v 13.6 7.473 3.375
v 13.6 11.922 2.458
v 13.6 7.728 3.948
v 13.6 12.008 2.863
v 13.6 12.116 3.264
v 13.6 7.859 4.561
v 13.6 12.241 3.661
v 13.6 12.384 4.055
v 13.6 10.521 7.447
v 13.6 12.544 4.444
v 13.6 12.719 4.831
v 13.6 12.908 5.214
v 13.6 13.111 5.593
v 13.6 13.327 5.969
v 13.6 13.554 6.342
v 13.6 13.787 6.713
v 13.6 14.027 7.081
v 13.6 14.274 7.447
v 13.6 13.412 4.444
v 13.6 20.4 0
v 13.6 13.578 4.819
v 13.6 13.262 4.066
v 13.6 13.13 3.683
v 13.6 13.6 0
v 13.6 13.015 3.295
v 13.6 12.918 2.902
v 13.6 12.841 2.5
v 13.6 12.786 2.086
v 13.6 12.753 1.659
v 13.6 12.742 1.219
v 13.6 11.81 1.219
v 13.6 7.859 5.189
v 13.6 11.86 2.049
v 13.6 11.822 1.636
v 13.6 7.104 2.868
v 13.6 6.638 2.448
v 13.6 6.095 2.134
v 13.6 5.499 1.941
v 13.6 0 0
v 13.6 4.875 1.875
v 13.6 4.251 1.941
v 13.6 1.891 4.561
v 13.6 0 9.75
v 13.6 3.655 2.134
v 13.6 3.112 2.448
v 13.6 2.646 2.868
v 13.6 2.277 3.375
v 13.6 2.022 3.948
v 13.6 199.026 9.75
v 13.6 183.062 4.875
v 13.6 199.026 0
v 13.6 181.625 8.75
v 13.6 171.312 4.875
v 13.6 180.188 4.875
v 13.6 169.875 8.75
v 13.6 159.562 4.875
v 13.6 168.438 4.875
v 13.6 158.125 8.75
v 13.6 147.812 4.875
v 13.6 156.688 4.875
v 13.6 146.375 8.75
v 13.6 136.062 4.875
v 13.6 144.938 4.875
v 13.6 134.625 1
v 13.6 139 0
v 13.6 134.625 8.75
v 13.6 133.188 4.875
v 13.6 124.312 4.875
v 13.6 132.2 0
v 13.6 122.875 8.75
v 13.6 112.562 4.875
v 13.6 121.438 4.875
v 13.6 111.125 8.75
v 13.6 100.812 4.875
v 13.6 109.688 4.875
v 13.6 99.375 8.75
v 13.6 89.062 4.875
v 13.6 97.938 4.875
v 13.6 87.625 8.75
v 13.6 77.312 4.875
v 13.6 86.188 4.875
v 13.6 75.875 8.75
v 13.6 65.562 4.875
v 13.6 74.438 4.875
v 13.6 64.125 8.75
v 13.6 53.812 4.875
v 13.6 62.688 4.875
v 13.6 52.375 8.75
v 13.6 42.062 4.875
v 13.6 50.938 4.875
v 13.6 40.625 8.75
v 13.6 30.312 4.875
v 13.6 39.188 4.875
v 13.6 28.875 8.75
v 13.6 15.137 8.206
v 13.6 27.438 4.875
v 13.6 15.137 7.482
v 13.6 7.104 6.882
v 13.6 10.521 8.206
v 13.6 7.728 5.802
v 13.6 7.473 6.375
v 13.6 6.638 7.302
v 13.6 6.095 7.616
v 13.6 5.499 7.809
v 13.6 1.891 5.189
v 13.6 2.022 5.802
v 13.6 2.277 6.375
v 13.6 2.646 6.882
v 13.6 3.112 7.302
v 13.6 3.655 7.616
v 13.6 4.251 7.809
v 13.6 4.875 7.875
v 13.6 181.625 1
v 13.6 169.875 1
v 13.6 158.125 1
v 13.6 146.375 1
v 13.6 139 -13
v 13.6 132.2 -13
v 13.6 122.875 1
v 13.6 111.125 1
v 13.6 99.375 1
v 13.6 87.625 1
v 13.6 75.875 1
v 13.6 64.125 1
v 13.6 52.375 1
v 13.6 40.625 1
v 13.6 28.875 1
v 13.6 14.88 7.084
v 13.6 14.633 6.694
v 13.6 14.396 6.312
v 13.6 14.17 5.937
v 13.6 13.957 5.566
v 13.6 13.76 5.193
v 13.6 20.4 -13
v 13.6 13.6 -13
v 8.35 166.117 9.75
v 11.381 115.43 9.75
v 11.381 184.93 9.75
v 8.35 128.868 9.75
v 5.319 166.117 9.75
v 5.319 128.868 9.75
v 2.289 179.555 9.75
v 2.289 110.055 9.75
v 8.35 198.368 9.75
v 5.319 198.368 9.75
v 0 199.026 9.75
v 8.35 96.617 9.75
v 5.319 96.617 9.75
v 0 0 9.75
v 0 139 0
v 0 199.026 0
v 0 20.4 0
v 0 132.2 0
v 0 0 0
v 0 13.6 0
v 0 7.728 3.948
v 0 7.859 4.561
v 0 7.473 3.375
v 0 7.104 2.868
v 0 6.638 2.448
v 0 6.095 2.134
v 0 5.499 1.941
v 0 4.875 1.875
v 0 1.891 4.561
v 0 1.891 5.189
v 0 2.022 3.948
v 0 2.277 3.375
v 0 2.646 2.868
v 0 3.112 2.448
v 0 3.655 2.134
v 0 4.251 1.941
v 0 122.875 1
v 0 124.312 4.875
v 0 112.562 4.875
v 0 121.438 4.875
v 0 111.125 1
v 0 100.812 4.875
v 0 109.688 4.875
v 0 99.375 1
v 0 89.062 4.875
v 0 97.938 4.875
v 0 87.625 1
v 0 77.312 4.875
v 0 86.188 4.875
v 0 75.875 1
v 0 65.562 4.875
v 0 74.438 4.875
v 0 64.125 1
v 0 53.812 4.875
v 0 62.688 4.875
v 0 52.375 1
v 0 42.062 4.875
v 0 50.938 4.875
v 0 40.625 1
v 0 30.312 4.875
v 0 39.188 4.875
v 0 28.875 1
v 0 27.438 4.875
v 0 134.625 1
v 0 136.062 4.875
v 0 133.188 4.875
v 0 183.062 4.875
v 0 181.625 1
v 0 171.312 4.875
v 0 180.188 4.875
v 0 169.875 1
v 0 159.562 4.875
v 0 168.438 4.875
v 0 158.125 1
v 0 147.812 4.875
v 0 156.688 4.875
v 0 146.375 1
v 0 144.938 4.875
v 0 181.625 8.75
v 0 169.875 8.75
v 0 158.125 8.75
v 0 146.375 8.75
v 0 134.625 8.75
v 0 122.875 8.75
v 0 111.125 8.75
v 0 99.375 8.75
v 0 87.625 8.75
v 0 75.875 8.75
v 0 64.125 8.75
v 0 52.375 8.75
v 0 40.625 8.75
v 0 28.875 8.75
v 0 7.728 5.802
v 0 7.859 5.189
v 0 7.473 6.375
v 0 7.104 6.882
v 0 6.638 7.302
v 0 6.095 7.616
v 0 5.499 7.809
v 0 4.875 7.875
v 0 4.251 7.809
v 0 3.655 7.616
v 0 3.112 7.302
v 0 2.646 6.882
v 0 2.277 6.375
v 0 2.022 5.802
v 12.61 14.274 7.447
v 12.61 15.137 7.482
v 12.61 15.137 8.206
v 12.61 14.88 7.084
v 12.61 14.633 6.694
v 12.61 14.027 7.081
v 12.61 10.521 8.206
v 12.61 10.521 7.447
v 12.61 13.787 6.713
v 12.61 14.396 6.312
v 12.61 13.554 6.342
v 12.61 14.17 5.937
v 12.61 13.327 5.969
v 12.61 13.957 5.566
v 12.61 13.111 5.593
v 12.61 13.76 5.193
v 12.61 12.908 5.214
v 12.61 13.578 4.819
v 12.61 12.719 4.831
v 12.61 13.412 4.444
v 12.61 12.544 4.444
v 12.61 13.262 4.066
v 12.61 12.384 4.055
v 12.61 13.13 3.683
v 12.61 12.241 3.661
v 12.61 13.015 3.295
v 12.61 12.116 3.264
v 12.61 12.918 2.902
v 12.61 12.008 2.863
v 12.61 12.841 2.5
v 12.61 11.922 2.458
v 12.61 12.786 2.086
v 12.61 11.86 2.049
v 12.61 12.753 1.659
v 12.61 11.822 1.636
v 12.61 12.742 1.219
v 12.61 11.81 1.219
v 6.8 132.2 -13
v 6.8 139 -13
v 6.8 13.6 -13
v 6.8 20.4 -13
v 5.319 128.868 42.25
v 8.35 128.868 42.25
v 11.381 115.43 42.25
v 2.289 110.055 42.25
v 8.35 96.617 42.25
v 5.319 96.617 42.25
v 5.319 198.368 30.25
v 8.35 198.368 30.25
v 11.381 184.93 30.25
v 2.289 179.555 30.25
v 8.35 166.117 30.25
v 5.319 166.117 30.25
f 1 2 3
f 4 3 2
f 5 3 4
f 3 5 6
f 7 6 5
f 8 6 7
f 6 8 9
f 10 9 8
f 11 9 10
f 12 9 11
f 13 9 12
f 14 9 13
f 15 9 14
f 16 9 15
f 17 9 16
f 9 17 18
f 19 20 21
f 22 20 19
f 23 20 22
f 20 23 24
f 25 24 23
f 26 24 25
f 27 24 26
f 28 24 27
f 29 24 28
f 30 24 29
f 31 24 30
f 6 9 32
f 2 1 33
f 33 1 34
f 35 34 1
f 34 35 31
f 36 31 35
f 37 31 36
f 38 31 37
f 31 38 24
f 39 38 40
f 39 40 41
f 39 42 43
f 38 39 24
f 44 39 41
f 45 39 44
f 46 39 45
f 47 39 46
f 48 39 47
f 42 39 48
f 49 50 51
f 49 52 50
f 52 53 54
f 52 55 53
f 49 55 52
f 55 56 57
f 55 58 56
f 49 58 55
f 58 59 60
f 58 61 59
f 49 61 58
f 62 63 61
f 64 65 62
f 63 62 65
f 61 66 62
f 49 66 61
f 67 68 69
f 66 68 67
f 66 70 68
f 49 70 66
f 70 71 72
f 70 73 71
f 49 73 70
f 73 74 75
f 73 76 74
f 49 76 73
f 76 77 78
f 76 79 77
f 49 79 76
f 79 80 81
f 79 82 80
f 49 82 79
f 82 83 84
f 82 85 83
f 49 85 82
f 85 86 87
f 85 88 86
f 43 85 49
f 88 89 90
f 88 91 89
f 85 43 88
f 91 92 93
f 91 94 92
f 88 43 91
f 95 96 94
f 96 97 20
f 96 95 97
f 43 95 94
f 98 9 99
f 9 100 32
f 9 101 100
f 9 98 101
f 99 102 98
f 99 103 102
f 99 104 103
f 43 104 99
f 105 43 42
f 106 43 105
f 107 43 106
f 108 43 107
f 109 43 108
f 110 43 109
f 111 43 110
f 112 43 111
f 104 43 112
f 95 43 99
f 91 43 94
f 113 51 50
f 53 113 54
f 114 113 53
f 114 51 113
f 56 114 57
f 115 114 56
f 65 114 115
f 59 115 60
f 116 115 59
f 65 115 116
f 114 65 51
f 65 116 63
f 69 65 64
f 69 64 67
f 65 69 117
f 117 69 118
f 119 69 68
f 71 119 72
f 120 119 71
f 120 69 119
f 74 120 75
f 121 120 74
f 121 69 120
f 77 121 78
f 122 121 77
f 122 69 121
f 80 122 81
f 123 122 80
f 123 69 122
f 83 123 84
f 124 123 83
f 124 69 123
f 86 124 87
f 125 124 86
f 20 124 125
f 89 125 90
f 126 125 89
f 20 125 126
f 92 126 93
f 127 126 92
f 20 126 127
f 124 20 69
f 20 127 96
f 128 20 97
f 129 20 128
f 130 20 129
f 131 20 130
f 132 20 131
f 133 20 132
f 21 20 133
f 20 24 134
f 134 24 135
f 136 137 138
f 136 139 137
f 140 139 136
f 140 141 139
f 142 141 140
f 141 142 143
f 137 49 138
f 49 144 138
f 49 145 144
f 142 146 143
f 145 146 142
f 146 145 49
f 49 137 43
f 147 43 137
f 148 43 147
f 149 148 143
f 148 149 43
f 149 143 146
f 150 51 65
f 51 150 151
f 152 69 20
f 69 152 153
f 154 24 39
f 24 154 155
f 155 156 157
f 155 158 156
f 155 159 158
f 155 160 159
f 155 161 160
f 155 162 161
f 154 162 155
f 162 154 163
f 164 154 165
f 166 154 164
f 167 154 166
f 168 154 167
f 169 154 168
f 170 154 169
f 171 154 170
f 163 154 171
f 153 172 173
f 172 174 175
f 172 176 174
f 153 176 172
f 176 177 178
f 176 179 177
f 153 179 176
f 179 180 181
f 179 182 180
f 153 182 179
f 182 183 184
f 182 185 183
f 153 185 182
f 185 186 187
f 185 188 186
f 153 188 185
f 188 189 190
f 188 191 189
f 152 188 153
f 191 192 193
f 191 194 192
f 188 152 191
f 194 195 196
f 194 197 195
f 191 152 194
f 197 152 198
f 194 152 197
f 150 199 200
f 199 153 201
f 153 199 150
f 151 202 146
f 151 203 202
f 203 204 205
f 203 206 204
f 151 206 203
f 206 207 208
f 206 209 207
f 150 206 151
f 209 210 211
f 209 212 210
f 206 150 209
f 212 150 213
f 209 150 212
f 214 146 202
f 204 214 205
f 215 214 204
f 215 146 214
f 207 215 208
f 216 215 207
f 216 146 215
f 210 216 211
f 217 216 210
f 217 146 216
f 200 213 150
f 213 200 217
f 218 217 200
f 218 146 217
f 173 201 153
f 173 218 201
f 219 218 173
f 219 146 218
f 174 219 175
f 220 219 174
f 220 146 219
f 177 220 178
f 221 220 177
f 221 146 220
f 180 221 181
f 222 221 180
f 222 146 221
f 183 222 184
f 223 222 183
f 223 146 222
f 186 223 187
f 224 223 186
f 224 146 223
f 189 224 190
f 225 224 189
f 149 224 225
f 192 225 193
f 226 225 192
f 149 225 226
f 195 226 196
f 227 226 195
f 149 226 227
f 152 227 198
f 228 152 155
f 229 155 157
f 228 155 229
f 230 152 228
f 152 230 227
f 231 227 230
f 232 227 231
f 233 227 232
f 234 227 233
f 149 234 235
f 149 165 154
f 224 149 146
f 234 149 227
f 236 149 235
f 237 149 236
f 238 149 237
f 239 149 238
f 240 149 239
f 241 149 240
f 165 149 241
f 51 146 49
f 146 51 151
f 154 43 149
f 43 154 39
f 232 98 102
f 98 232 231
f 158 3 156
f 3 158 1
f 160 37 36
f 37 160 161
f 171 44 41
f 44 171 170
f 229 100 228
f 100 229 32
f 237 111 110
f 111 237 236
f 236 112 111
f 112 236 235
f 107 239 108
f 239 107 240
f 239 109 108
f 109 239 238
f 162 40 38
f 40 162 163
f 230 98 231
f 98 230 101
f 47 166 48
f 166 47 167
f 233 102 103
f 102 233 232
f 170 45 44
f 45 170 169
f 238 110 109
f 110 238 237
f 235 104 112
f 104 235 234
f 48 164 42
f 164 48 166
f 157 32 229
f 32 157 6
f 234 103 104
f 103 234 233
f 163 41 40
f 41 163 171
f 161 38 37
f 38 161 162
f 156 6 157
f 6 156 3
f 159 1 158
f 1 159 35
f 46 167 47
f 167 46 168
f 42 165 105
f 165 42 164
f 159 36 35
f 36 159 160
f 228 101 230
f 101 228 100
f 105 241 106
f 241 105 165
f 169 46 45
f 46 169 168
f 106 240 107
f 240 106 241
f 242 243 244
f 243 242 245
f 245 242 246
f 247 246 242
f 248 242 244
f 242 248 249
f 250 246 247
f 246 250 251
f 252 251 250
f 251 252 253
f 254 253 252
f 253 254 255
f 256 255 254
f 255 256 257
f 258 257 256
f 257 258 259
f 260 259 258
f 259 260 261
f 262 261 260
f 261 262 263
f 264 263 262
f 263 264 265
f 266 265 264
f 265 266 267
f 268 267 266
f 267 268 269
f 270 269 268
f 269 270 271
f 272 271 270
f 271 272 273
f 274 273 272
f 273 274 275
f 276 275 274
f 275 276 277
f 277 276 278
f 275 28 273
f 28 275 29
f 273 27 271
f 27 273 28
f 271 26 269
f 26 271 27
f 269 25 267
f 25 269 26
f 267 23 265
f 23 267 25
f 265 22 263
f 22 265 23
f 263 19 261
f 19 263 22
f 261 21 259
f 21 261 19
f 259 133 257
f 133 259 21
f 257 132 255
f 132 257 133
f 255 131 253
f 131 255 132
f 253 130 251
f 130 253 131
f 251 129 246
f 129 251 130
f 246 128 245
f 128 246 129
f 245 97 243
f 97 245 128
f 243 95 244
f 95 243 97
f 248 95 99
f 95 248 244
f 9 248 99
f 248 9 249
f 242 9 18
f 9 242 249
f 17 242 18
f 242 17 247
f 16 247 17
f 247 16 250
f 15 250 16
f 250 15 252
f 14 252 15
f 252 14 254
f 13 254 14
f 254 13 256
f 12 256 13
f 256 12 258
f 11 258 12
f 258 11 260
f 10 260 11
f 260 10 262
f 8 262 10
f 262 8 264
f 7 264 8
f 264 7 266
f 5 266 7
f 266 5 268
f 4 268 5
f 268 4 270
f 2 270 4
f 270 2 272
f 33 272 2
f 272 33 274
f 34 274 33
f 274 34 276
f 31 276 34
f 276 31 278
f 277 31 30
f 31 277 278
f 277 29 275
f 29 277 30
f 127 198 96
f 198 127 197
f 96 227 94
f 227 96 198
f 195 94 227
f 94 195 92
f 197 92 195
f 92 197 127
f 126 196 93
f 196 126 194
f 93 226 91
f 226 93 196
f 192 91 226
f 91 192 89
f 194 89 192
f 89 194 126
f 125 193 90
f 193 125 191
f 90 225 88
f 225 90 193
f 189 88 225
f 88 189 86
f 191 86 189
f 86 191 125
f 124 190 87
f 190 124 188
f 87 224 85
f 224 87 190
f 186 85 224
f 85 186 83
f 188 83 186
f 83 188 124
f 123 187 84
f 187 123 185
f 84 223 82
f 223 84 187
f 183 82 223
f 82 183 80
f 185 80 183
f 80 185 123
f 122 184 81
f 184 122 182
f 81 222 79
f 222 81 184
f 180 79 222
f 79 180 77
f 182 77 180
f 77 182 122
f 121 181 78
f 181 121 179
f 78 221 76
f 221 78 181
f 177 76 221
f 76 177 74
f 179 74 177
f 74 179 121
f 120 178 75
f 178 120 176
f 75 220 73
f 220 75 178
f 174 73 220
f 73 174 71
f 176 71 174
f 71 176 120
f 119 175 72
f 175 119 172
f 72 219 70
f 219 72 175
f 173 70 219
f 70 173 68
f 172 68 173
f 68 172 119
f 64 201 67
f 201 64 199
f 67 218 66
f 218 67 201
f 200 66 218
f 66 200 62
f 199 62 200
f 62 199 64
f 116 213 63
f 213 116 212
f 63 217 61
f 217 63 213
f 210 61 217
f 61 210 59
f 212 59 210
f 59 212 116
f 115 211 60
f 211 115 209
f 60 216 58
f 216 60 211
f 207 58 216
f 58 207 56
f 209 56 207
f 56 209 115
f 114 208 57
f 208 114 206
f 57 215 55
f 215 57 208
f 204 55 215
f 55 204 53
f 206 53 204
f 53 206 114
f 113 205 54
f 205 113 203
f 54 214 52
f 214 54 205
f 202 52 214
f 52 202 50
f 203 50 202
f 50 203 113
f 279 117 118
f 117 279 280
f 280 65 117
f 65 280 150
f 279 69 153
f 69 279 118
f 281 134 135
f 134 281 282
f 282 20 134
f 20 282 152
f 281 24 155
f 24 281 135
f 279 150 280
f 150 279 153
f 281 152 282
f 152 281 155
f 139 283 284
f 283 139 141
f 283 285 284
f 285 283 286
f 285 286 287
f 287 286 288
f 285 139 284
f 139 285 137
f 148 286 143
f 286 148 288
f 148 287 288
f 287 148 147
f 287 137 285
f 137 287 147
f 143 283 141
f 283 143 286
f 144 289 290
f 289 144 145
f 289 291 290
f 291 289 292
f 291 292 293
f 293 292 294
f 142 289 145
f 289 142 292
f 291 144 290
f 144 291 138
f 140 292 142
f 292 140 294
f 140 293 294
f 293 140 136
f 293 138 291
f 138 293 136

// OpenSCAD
// file: values.scad
$fs=0.1;
//Constants:
edgeRadius=1.5;
underKeyWidth=13.6;
baseHeight=9.75;
genh=5.791666666666667;
a=27.423996629776394;
b=12.370392724366756;
c=12.370392724366756;
d=38.393595281686956;
overhead=65.81759191146335;
keyTravelDistance=13.0;
desiredGamut=24;
shift=3.092598181091689;
holeScale=0.5;
stalkScale=0.48;

Points = [
[shift,a,0],//0
[(b-shift),0,0],//1
[(b+shift),0,0],//2
[(b+c-shift),d,0],//3
[(c+shift),(a+d),0],//4
[(c-shift),(a+d),0],//5
[shift,a,keyTravelDistance],//6
[(b-shift),0,keyTravelDistance],//7
[(b+shift),0,keyTravelDistance],//8
[(b+c-shift),d,keyTravelDistance],//9
[(c+shift),(a+d),keyTravelDistance],//10
[(c-shift),(a+d),keyTravelDistance],//11
];
Faces = [
[0,1,2,3,4,5],
[1,0,6,7],
[2,1,7,8],
[3,2,8,9],
[4,3,9,10],
[5,4,10,11],
[0,5,11,6],
[11,10,9,8,7,6] 
];
// file: keytop.scad
include<values.scad>;
keytop();

module keytopShape(){
polyhedron(Points,Faces);
}
module keytop(){
difference(){
keytopShape();
translate([(b+c)/4,(d+a)/4,-0.1])
scale(holeScale,holeScale,holeScale)
keytopShape();
edge(6,11,1,-1);
edge(6,7,1,1);
edge(7,8,1,1);
edge(8,9,1,1);
edge(9,10,1,-1,-1);
edge(10,11,1,-1);
}
module edge (point1,point2,d1,d2,d3=1){
difference(){
translate([Points[point1][0],Points[point1][1],Points[point1][2]])
rotate([0,90,atan((Points[point2][1]-Points[point1][1])/(Points[point2][0]-Points[point1][0]))])
translate([0,0,d3*30])
rotate(45,0,0)
cube([pow(2*(edgeRadius*edgeRadius),1/2),pow(2*(edgeRadius*edgeRadius),1/2),90],true);
translate([Points[point1][0],Points[point1][1],Points[point1][2]])
rotate([0,90,atan((Points[point2][1]-Points[point1][1])/(Points[point2][0]-Points[point1][0]))])
translate([d1*edgeRadius,d2*edgeRadius,d3*30])
cylinder(90,edgeRadius,edgeRadius, true);
}
}

}
// main file
use<keytop.scad>
include<values.scad>
rotate([0,90,0])7_11();
module 7_11(keytops=false){
length=199.0259252447967;
rotate([0,-90,0]){
//Main Base:
difference(){
cube([underKeyWidth,length,baseHeight],false);
translate([-.1,0.5*baseHeight,0.5*baseHeight])rotate([0,90,0])
cylinder((underKeyWidth+.2),r=3, false);
translate([underKeyWidth-.99,10,0.125*baseHeight])
rotate([90,0,90])
linear_extrude(height=1){
text("7",size=baseHeight*0.75);
}

//Warp Cuts:
translate([-1,0.0+25+0.25*baseHeight,baseHeight-1])
rotate([0,90,0])
linear_extrude(height=underKeyWidth+2)
polygon(points=[[0.5*baseHeight-1,0],[baseHeight-2,0.25*baseHeight-1],[0.5*baseHeight-1,0.5*baseHeight-2],[0,0.25*baseHeight-1]]);
translate([-1,11.75+25+0.25*baseHeight,baseHeight-1])
rotate([0,90,0])
linear_extrude(height=underKeyWidth+2)
polygon(points=[[0.5*baseHeight-1,0],[baseHeight-2,0.25*baseHeight-1],[0.5*baseHeight-1,0.5*baseHeight-2],[0,0.25*baseHeight-1]]);
translate([-1,23.5+25+0.25*baseHeight,baseHeight-1])
rotate([0,90,0])
linear_extrude(height=underKeyWidth+2)
polygon(points=[[0.5*baseHeight-1,0],[baseHeight-2,0.25*baseHeight-1],[0.5*baseHeight-1,0.5*baseHeight-2],[0,0.25*baseHeight-1]]);
translate([-1,35.25+25+0.25*baseHeight,baseHeight-1])
rotate([0,90,0])
linear_extrude(height=underKeyWidth+2)
polygon(points=[[0.5*baseHeight-1,0],[baseHeight-2,0.25*baseHeight-1],[0.5*baseHeight-1,0.5*baseHeight-2],[0,0.25*baseHeight-1]]);
translate([-1,47.0+25+0.25*baseHeight,baseHeight-1])
rotate([0,90,0])
linear_extrude(height=underKeyWidth+2)
polygon(points=[[0.5*baseHeight-1,0],[baseHeight-2,0.25*baseHeight-1],[0.5*baseHeight-1,0.5*baseHeight-2],[0,0.25*baseHeight-1]]);
translate([-1,58.75+25+0.25*baseHeight,baseHeight-1])
rotate([0,90,0])
linear_extrude(height=underKeyWidth+2)
polygon(points=[[0.5*baseHeight-1,0],[baseHeight-2,0.25*baseHeight-1],[0.5*baseHeight-1,0.5*baseHeight-2],[0,0.25*baseHeight-1]]);
translate([-1,70.5+25+0.25*baseHeight,baseHeight-1])
rotate([0,90,0])
linear_extrude(height=underKeyWidth+2)
polygon(points=[[0.5*baseHeight-1,0],[baseHeight-2,0.25*baseHeight-1],[0.5*baseHeight-1,0.5*baseHeight-2],[0,0.25*baseHeight-1]]);
translate([-1,82.25+25+0.25*baseHeight,baseHeight-1])
rotate([0,90,0])
linear_extrude(height=underKeyWidth+2)
polygon(points=[[0.5*baseHeight-1,0],[baseHeight-2,0.25*baseHeight-1],[0.5*baseHeight-1,0.5*baseHeight-2],[0,0.25*baseHeight-1]]);
translate([-1,94.0+25+0.25*baseHeight,baseHeight-1])
rotate([0,90,0])
linear_extrude(height=underKeyWidth+2)
polygon(points=[[0.5*baseHeight-1,0],[baseHeight-2,0.25*baseHeight-1],[0.5*baseHeight-1,0.5*baseHeight-2],[0,0.25*baseHeight-1]]);
translate([-1,105.75+25+0.25*baseHeight,baseHeight-1])
rotate([0,90,0])
linear_extrude(height=underKeyWidth+2)
polygon(points=[[0.5*baseHeight-1,0],[baseHeight-2,0.25*baseHeight-1],[0.5*baseHeight-1,0.5*baseHeight-2],[0,0.25*baseHeight-1]]);
translate([-1,117.5+25+0.25*baseHeight,baseHeight-1])
rotate([0,90,0])
linear_extrude(height=underKeyWidth+2)
polygon(points=[[0.5*baseHeight-1,0],[baseHeight-2,0.25*baseHeight-1],[0.5*baseHeight-1,0.5*baseHeight-2],[0,0.25*baseHeight-1]]);
translate([-1,129.25+25+0.25*baseHeight,baseHeight-1])
rotate([0,90,0])
linear_extrude(height=underKeyWidth+2)
polygon(points=[[0.5*baseHeight-1,0],[baseHeight-2,0.25*baseHeight-1],[0.5*baseHeight-1,0.5*baseHeight-2],[0,0.25*baseHeight-1]]);
translate([-1,141.0+25+0.25*baseHeight,baseHeight-1])
rotate([0,90,0])
linear_extrude(height=underKeyWidth+2)
polygon(points=[[0.5*baseHeight-1,0],[baseHeight-2,0.25*baseHeight-1],[0.5*baseHeight-1,0.5*baseHeight-2],[0,0.25*baseHeight-1]]);
translate([-1,152.75+25+0.25*baseHeight,baseHeight-1])
rotate([0,90,0])
linear_extrude(height=underKeyWidth+2)
polygon(points=[[0.5*baseHeight-1,0],[baseHeight-2,0.25*baseHeight-1],[0.5*baseHeight-1,0.5*baseHeight-2],[0,0.25*baseHeight-1]]);
}
//Key Stalks:
translate([shift/4,(genh*11-(d+a)/2+overhead),baseHeight]){
linear_extrude(height=(keyTravelDistance*1.5+desiredGamut-11)){
scale((stalkScale+holeScale)/2,stalkScale)
polygon(points=[
[Points[0][0],Points[0][1]],[Points[1][0],Points[1][1]],[Points[2][0],Points[2][1]],[Points[3][0],Points[3][1]],[Points[4][0],Points[4][1]],[Points[5][0],Points[5][1]],[Points[6][0],Points[6][1]]
]);
}
if(keytops)
translate([0,(-0.5*(a+d)),(keyTravelDistance*1.5+desiredGamut-11+40)])
keytop();
}
translate([shift/4,(genh*23-(d+a)/2+overhead),baseHeight]){
linear_extrude(height=(keyTravelDistance*1.5+desiredGamut-23)){
scale((stalkScale+holeScale)/2,stalkScale)
polygon(points=[
[Points[0][0],Points[0][1]],[Points[1][0],Points[1][1]],[Points[2][0],Points[2][1]],[Points[3][0],Points[3][1]],[Points[4][0],Points[4][1]],[Points[5][0],Points[5][1]],[Points[6][0],Points[6][1]]
]);
}
if(keytops)
translate([0,(-0.5*(a+d)),(keyTravelDistance*1.5+desiredGamut-23+40)])
keytop();
}
//Feet:
difference(){union(){translate([0,132.2,-13.0]){
cube([13.6,6.8,13.0],false);}
translate([0,13.6,-13.0]){
cube([13.6,6.8,13.0],false);}}
rotate([0,-27.613027823084472,0])
translate([-26.0,0.5,-26.0])
cube([26.0,203.70833333333334,26.0]);
}
}}
